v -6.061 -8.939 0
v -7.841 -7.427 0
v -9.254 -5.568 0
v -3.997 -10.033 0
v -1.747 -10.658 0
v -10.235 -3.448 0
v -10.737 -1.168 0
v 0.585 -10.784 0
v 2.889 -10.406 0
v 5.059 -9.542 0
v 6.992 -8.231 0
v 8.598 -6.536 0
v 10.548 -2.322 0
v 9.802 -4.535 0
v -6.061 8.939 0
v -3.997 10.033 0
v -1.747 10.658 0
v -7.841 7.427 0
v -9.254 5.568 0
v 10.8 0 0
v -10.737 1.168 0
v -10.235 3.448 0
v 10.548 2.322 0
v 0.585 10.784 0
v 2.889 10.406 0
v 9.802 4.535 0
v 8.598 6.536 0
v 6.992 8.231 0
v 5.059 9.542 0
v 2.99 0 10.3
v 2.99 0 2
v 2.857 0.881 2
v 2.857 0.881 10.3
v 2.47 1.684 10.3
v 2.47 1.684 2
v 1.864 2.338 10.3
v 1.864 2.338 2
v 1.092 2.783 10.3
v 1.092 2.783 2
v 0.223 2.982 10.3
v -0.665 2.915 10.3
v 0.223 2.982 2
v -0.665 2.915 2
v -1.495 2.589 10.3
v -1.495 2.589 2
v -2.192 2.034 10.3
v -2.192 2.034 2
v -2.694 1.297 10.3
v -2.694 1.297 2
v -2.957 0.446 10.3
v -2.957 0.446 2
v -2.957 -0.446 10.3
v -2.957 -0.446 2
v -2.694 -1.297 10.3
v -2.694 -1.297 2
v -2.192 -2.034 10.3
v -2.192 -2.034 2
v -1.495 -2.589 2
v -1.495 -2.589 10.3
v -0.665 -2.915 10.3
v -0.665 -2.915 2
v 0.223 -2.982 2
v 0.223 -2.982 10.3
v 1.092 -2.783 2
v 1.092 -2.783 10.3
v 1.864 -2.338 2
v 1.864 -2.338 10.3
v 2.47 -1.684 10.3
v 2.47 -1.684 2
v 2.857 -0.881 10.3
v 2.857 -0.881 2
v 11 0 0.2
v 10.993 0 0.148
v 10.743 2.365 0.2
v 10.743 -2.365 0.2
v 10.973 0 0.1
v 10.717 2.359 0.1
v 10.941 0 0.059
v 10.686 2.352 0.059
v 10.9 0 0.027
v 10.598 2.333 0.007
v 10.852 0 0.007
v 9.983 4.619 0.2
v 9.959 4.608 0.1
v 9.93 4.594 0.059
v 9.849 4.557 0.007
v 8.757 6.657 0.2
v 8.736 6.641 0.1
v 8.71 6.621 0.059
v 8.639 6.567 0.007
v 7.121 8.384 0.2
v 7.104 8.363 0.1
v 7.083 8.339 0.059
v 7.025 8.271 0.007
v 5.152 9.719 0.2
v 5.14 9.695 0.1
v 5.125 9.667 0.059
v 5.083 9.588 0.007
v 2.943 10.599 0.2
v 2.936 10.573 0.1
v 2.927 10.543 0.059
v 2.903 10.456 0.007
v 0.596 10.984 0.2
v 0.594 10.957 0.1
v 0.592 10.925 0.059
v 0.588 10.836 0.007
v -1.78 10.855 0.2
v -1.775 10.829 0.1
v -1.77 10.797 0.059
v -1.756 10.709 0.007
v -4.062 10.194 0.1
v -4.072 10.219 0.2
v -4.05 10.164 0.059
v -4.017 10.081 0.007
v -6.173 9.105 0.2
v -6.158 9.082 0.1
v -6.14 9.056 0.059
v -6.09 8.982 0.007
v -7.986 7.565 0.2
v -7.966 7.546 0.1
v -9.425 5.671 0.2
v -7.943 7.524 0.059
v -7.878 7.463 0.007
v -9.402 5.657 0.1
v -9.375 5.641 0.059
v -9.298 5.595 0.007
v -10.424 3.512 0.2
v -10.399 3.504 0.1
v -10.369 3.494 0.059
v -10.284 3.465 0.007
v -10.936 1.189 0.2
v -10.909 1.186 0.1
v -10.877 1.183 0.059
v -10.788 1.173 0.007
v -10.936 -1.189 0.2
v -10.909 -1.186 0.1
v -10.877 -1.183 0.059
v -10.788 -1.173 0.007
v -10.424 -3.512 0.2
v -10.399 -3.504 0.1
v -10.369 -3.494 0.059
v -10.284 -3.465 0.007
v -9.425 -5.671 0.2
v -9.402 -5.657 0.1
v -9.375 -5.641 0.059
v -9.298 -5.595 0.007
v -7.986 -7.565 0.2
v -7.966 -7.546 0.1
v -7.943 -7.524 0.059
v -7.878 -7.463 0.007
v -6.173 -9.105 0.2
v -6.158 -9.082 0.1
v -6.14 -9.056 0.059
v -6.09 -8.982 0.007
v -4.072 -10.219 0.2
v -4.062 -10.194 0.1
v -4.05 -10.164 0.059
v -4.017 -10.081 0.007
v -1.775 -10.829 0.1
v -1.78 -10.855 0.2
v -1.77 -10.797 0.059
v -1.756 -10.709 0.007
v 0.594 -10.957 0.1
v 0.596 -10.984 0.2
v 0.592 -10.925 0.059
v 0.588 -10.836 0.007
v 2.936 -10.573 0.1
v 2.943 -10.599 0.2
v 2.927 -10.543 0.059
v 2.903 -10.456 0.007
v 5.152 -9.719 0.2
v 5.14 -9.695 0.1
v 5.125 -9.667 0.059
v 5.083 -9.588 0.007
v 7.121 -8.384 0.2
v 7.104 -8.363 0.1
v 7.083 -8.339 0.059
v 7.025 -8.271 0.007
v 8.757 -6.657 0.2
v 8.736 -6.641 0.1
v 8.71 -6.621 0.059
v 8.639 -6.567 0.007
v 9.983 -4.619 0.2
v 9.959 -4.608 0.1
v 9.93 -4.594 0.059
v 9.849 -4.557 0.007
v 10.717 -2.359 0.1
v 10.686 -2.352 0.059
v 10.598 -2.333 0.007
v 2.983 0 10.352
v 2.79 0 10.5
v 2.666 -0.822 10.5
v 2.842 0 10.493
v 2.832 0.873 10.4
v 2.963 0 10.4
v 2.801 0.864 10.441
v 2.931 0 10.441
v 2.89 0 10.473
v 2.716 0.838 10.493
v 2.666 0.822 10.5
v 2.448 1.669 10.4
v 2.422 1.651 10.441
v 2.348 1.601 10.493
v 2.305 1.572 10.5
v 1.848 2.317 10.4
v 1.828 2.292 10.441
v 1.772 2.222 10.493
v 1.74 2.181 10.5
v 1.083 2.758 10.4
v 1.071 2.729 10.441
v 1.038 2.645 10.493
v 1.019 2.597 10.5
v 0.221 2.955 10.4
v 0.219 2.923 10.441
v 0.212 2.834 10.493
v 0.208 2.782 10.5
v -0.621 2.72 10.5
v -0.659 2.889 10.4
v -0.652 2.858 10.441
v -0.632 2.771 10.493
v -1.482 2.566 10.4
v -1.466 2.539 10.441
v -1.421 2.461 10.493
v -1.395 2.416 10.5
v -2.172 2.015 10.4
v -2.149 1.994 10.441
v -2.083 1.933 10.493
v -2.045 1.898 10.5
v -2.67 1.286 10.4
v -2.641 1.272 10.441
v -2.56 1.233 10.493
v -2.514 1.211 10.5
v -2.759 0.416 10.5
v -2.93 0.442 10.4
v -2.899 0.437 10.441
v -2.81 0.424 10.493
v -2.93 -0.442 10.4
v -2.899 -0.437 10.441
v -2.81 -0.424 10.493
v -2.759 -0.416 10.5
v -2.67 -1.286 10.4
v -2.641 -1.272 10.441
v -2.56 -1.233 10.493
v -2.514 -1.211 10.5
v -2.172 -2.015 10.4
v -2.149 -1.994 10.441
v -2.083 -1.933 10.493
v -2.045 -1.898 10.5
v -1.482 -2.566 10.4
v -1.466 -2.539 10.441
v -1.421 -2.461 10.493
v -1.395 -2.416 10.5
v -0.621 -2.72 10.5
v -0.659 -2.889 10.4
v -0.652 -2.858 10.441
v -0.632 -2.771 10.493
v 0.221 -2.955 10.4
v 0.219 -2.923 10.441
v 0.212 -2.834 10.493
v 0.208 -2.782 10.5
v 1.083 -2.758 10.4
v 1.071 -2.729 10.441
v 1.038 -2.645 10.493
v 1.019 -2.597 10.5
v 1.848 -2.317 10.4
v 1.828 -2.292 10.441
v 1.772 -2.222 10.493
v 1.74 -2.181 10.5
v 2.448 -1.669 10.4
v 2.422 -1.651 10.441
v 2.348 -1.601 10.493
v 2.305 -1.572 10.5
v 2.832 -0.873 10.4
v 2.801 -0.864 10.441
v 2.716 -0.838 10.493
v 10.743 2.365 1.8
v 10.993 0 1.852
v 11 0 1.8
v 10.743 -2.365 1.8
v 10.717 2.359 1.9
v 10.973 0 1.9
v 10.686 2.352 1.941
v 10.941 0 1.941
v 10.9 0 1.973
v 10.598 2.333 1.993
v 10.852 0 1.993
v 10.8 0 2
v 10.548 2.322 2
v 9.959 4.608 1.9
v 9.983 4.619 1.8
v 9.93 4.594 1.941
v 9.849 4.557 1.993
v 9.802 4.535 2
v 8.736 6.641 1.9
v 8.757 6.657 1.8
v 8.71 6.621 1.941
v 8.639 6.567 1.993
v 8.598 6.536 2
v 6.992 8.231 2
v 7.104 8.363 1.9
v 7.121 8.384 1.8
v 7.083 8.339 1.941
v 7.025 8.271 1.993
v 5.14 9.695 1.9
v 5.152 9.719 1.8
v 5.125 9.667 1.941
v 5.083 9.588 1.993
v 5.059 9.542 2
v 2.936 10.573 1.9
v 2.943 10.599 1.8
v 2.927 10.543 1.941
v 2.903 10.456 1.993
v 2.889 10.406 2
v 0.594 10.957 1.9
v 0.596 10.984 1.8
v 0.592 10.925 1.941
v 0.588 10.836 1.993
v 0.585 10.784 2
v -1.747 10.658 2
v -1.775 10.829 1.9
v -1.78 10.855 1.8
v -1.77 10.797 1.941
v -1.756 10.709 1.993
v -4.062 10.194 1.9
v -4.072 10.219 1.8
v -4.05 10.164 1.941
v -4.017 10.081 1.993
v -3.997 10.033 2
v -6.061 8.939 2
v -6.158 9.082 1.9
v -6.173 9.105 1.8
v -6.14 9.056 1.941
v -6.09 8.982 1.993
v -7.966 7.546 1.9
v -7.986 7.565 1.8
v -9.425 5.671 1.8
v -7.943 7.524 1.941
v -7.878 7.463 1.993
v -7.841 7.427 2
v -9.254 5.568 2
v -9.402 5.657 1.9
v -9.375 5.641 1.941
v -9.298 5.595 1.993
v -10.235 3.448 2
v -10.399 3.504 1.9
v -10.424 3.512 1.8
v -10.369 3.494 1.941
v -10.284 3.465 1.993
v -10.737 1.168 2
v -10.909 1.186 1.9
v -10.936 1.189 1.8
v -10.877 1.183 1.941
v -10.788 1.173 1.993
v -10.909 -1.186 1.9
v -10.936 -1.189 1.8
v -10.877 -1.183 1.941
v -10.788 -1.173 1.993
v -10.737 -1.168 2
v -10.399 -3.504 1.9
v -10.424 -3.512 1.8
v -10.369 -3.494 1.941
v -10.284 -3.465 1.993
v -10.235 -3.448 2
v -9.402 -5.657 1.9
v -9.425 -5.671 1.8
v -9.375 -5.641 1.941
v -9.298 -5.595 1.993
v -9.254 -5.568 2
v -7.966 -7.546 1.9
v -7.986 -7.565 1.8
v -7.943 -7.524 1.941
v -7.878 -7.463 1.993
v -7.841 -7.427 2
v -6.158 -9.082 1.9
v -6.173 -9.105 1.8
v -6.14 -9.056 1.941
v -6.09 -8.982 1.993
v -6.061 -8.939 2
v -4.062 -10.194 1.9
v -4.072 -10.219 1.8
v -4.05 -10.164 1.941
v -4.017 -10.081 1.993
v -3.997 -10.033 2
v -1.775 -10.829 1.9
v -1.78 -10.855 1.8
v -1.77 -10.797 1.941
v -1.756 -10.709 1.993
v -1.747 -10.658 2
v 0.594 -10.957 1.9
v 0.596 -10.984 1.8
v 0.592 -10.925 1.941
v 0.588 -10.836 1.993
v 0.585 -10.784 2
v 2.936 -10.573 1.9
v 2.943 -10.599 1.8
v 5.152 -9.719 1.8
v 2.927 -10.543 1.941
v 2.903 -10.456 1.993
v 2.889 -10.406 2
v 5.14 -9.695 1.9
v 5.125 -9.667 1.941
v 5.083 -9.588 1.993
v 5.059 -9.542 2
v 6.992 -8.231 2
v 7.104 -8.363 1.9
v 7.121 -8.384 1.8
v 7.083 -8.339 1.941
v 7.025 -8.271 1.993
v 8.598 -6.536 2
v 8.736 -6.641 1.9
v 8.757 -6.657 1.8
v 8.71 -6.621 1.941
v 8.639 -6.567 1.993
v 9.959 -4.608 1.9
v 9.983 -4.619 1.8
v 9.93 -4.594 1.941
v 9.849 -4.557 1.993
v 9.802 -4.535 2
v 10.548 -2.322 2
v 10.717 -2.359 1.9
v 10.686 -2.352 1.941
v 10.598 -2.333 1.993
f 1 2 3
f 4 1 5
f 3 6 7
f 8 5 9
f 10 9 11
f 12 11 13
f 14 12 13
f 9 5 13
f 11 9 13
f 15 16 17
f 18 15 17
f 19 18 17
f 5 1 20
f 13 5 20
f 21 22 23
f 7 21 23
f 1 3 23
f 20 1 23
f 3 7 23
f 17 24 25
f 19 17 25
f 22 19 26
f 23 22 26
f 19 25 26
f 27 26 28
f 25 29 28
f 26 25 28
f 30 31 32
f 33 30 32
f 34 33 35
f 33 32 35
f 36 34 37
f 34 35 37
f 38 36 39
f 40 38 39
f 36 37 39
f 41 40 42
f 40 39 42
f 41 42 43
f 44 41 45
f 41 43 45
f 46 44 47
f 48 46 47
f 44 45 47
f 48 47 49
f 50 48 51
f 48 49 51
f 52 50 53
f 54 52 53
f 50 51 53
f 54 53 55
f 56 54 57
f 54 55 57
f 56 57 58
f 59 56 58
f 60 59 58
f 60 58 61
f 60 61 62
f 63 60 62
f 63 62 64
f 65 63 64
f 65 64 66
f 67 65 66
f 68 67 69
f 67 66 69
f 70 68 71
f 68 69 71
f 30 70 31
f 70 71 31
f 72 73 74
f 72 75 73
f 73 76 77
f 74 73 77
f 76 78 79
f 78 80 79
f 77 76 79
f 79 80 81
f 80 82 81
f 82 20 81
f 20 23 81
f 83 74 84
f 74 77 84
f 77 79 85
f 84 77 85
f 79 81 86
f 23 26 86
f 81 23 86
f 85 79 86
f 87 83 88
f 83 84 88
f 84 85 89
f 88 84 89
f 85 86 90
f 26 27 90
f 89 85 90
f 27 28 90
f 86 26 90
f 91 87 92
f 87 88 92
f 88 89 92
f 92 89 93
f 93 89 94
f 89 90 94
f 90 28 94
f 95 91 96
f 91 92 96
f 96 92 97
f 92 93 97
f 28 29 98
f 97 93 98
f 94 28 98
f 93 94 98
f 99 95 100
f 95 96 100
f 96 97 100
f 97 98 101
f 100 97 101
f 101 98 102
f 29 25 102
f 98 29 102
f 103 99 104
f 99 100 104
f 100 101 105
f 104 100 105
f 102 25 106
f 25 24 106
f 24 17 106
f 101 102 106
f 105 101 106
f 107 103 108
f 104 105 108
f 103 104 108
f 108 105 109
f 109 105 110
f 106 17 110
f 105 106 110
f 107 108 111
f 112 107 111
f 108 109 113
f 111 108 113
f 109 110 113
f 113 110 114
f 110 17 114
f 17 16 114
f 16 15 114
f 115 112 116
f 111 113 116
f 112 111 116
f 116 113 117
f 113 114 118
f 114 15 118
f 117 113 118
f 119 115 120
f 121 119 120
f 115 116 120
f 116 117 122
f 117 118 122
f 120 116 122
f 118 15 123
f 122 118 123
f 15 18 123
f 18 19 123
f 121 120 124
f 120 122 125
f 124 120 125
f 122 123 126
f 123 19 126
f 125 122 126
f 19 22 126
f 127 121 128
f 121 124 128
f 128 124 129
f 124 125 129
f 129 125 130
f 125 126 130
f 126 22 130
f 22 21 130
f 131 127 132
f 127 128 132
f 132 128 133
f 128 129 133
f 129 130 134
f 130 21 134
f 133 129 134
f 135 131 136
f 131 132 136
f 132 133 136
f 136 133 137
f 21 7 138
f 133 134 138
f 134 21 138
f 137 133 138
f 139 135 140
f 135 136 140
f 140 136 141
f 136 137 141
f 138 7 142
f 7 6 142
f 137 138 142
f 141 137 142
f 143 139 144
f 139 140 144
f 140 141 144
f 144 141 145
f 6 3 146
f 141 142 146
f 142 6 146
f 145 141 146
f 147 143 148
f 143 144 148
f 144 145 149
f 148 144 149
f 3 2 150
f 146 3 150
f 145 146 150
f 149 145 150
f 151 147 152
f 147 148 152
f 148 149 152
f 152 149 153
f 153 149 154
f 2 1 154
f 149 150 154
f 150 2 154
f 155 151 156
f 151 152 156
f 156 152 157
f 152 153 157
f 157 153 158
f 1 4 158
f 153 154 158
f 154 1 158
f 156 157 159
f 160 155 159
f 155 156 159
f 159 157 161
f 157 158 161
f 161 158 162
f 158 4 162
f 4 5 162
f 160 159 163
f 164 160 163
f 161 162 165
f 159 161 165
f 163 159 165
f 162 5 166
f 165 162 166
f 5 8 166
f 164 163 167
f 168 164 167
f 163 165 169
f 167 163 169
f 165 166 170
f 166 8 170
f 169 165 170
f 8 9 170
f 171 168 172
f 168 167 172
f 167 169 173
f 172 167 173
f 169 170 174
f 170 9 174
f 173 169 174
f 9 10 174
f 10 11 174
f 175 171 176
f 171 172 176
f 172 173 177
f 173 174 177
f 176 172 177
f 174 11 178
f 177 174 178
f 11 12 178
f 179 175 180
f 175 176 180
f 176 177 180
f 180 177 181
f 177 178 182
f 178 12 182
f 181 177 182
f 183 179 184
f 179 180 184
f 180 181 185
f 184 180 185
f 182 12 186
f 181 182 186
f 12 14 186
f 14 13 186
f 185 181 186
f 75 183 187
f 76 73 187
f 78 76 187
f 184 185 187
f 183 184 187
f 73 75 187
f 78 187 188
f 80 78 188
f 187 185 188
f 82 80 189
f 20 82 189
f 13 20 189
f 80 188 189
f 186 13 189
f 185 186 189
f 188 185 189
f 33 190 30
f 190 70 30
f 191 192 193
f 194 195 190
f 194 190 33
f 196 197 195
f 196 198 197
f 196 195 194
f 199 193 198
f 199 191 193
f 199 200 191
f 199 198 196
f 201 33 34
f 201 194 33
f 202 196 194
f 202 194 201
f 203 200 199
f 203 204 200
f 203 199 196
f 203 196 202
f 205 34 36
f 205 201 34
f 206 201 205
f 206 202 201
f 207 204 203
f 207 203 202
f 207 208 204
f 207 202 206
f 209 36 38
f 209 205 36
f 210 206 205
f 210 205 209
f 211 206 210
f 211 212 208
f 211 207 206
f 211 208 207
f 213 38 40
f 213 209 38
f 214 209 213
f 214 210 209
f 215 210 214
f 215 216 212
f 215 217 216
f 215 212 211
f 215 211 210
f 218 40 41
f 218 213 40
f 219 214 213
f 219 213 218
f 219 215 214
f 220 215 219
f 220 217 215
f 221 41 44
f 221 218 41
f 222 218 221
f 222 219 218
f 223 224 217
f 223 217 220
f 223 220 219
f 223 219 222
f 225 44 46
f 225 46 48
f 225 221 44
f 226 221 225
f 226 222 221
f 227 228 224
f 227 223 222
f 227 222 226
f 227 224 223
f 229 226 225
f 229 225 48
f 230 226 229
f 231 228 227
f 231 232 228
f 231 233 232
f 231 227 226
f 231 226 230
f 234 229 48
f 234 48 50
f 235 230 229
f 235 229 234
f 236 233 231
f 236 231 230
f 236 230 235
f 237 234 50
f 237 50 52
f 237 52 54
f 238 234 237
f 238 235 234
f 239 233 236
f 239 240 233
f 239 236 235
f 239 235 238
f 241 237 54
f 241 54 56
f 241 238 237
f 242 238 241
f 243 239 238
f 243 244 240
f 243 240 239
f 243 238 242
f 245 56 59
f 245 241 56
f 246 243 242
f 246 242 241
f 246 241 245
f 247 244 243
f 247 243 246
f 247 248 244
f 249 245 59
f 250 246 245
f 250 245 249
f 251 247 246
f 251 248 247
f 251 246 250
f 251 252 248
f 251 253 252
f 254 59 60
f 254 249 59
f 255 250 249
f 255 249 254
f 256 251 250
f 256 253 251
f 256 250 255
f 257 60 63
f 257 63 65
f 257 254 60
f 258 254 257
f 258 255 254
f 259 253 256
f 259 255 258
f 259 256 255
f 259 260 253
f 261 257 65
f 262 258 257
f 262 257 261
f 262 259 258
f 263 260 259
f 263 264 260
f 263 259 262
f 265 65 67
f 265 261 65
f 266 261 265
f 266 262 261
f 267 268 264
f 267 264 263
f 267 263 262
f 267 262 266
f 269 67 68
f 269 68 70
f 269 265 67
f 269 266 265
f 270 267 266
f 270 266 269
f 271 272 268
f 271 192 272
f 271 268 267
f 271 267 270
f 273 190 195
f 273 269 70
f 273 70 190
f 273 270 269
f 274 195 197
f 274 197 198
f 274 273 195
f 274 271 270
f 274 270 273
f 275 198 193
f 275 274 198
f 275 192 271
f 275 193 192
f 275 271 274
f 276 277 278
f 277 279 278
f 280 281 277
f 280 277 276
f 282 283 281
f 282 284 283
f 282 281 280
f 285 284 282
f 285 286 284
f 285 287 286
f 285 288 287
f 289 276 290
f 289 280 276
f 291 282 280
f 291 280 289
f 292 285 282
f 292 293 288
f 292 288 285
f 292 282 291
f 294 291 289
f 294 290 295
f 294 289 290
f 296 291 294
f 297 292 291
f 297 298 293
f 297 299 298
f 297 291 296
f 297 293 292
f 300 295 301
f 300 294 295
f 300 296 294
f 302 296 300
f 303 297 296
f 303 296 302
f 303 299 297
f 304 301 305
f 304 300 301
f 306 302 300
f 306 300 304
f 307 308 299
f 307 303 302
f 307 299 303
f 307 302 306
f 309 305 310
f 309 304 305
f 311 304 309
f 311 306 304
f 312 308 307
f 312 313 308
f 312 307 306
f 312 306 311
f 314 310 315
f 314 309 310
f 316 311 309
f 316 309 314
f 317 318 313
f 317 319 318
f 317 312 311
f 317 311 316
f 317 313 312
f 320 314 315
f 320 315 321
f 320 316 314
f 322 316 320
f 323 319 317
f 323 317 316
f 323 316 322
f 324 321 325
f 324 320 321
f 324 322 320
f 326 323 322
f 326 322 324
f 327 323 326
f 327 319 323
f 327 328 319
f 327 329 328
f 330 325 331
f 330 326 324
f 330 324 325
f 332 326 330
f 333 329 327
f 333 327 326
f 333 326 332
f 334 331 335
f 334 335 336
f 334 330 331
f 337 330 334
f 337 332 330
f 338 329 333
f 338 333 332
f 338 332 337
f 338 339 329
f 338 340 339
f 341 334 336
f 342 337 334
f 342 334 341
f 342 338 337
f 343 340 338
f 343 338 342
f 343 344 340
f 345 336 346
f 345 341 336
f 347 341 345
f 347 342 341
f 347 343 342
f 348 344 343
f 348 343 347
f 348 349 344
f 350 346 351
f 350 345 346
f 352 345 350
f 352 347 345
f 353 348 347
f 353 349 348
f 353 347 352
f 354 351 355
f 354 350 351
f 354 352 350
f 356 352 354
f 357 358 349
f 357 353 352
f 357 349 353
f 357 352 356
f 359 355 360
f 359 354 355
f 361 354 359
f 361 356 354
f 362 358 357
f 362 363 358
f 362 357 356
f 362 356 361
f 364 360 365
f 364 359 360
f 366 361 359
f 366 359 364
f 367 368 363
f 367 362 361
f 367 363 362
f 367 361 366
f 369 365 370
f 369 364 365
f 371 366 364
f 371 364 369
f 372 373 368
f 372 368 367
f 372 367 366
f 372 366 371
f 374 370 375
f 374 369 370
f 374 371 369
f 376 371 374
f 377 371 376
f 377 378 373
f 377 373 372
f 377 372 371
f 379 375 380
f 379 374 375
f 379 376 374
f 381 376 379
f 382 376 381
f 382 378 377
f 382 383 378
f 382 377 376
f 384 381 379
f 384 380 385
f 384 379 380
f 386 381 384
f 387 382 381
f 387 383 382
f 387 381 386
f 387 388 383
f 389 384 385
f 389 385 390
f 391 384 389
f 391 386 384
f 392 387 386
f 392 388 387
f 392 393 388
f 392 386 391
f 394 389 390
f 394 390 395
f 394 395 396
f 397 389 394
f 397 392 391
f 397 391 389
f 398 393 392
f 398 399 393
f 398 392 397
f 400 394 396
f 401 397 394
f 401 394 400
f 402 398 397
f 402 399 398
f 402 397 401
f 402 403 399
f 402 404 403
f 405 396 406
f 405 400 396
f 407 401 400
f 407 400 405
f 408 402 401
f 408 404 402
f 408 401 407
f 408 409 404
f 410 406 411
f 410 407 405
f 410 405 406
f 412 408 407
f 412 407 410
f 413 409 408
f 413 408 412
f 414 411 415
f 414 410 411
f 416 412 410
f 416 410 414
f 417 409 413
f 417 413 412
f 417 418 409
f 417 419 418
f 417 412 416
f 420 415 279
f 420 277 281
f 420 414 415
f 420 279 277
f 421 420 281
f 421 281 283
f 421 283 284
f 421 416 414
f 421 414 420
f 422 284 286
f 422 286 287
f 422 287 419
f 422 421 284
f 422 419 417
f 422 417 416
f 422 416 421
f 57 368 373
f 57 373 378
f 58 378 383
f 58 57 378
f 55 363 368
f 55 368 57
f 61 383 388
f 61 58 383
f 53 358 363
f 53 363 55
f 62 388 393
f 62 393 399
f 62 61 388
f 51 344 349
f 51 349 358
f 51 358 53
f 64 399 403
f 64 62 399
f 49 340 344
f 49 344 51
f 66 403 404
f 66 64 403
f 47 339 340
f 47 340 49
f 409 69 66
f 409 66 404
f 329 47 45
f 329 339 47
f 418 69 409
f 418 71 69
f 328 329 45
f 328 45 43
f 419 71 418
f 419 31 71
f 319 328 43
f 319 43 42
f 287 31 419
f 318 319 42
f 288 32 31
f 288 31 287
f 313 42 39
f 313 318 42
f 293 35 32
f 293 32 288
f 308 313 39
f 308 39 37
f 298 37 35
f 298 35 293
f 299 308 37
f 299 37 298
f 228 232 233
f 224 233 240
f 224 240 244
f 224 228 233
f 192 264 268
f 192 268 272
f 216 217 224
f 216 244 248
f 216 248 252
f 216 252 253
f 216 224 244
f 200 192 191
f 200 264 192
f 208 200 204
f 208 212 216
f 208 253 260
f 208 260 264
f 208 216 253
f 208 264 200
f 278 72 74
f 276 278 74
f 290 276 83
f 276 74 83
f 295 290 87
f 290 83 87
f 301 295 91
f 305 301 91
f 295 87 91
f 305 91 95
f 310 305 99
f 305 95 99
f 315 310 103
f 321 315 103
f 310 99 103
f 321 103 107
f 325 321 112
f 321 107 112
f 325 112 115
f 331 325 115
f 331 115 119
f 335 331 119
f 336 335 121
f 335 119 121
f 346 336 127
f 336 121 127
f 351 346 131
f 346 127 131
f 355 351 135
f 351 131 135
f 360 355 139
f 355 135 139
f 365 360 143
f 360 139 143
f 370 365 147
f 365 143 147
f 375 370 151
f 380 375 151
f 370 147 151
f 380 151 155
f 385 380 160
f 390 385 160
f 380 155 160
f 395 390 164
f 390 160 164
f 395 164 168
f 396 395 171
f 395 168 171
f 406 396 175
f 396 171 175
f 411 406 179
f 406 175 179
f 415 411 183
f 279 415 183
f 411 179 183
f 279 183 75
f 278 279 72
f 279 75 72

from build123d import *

# Parameters (mm, degrees)
F0_R     = 11
F1_DEPTH = 2
F2_R     = 2.99
F3_DEPTH = 8.5
F4_R     = 0.2


with BuildPart() as f1:
    # F0 (on Top) → F1 (new body)
    with BuildSketch(Plane.XY):
        Circle(F0_R)
    extrude(amount=F1_DEPTH)

    # F2 (on face) → F3 (join)
    with BuildSketch(Plane.XY.offset(2)):
        Circle(F2_R)
    extrude(amount=F3_DEPTH)

    # F4
    f4_edges = [f1.edges().sort_by_distance(p)[0] for p in [
        (-11, 0, 2),
        (-11, 0, 0),
        (-2.99, 0, 10.5),
    ]]
    fillet(f4_edges, radius=F4_R)


solid = f1.part
